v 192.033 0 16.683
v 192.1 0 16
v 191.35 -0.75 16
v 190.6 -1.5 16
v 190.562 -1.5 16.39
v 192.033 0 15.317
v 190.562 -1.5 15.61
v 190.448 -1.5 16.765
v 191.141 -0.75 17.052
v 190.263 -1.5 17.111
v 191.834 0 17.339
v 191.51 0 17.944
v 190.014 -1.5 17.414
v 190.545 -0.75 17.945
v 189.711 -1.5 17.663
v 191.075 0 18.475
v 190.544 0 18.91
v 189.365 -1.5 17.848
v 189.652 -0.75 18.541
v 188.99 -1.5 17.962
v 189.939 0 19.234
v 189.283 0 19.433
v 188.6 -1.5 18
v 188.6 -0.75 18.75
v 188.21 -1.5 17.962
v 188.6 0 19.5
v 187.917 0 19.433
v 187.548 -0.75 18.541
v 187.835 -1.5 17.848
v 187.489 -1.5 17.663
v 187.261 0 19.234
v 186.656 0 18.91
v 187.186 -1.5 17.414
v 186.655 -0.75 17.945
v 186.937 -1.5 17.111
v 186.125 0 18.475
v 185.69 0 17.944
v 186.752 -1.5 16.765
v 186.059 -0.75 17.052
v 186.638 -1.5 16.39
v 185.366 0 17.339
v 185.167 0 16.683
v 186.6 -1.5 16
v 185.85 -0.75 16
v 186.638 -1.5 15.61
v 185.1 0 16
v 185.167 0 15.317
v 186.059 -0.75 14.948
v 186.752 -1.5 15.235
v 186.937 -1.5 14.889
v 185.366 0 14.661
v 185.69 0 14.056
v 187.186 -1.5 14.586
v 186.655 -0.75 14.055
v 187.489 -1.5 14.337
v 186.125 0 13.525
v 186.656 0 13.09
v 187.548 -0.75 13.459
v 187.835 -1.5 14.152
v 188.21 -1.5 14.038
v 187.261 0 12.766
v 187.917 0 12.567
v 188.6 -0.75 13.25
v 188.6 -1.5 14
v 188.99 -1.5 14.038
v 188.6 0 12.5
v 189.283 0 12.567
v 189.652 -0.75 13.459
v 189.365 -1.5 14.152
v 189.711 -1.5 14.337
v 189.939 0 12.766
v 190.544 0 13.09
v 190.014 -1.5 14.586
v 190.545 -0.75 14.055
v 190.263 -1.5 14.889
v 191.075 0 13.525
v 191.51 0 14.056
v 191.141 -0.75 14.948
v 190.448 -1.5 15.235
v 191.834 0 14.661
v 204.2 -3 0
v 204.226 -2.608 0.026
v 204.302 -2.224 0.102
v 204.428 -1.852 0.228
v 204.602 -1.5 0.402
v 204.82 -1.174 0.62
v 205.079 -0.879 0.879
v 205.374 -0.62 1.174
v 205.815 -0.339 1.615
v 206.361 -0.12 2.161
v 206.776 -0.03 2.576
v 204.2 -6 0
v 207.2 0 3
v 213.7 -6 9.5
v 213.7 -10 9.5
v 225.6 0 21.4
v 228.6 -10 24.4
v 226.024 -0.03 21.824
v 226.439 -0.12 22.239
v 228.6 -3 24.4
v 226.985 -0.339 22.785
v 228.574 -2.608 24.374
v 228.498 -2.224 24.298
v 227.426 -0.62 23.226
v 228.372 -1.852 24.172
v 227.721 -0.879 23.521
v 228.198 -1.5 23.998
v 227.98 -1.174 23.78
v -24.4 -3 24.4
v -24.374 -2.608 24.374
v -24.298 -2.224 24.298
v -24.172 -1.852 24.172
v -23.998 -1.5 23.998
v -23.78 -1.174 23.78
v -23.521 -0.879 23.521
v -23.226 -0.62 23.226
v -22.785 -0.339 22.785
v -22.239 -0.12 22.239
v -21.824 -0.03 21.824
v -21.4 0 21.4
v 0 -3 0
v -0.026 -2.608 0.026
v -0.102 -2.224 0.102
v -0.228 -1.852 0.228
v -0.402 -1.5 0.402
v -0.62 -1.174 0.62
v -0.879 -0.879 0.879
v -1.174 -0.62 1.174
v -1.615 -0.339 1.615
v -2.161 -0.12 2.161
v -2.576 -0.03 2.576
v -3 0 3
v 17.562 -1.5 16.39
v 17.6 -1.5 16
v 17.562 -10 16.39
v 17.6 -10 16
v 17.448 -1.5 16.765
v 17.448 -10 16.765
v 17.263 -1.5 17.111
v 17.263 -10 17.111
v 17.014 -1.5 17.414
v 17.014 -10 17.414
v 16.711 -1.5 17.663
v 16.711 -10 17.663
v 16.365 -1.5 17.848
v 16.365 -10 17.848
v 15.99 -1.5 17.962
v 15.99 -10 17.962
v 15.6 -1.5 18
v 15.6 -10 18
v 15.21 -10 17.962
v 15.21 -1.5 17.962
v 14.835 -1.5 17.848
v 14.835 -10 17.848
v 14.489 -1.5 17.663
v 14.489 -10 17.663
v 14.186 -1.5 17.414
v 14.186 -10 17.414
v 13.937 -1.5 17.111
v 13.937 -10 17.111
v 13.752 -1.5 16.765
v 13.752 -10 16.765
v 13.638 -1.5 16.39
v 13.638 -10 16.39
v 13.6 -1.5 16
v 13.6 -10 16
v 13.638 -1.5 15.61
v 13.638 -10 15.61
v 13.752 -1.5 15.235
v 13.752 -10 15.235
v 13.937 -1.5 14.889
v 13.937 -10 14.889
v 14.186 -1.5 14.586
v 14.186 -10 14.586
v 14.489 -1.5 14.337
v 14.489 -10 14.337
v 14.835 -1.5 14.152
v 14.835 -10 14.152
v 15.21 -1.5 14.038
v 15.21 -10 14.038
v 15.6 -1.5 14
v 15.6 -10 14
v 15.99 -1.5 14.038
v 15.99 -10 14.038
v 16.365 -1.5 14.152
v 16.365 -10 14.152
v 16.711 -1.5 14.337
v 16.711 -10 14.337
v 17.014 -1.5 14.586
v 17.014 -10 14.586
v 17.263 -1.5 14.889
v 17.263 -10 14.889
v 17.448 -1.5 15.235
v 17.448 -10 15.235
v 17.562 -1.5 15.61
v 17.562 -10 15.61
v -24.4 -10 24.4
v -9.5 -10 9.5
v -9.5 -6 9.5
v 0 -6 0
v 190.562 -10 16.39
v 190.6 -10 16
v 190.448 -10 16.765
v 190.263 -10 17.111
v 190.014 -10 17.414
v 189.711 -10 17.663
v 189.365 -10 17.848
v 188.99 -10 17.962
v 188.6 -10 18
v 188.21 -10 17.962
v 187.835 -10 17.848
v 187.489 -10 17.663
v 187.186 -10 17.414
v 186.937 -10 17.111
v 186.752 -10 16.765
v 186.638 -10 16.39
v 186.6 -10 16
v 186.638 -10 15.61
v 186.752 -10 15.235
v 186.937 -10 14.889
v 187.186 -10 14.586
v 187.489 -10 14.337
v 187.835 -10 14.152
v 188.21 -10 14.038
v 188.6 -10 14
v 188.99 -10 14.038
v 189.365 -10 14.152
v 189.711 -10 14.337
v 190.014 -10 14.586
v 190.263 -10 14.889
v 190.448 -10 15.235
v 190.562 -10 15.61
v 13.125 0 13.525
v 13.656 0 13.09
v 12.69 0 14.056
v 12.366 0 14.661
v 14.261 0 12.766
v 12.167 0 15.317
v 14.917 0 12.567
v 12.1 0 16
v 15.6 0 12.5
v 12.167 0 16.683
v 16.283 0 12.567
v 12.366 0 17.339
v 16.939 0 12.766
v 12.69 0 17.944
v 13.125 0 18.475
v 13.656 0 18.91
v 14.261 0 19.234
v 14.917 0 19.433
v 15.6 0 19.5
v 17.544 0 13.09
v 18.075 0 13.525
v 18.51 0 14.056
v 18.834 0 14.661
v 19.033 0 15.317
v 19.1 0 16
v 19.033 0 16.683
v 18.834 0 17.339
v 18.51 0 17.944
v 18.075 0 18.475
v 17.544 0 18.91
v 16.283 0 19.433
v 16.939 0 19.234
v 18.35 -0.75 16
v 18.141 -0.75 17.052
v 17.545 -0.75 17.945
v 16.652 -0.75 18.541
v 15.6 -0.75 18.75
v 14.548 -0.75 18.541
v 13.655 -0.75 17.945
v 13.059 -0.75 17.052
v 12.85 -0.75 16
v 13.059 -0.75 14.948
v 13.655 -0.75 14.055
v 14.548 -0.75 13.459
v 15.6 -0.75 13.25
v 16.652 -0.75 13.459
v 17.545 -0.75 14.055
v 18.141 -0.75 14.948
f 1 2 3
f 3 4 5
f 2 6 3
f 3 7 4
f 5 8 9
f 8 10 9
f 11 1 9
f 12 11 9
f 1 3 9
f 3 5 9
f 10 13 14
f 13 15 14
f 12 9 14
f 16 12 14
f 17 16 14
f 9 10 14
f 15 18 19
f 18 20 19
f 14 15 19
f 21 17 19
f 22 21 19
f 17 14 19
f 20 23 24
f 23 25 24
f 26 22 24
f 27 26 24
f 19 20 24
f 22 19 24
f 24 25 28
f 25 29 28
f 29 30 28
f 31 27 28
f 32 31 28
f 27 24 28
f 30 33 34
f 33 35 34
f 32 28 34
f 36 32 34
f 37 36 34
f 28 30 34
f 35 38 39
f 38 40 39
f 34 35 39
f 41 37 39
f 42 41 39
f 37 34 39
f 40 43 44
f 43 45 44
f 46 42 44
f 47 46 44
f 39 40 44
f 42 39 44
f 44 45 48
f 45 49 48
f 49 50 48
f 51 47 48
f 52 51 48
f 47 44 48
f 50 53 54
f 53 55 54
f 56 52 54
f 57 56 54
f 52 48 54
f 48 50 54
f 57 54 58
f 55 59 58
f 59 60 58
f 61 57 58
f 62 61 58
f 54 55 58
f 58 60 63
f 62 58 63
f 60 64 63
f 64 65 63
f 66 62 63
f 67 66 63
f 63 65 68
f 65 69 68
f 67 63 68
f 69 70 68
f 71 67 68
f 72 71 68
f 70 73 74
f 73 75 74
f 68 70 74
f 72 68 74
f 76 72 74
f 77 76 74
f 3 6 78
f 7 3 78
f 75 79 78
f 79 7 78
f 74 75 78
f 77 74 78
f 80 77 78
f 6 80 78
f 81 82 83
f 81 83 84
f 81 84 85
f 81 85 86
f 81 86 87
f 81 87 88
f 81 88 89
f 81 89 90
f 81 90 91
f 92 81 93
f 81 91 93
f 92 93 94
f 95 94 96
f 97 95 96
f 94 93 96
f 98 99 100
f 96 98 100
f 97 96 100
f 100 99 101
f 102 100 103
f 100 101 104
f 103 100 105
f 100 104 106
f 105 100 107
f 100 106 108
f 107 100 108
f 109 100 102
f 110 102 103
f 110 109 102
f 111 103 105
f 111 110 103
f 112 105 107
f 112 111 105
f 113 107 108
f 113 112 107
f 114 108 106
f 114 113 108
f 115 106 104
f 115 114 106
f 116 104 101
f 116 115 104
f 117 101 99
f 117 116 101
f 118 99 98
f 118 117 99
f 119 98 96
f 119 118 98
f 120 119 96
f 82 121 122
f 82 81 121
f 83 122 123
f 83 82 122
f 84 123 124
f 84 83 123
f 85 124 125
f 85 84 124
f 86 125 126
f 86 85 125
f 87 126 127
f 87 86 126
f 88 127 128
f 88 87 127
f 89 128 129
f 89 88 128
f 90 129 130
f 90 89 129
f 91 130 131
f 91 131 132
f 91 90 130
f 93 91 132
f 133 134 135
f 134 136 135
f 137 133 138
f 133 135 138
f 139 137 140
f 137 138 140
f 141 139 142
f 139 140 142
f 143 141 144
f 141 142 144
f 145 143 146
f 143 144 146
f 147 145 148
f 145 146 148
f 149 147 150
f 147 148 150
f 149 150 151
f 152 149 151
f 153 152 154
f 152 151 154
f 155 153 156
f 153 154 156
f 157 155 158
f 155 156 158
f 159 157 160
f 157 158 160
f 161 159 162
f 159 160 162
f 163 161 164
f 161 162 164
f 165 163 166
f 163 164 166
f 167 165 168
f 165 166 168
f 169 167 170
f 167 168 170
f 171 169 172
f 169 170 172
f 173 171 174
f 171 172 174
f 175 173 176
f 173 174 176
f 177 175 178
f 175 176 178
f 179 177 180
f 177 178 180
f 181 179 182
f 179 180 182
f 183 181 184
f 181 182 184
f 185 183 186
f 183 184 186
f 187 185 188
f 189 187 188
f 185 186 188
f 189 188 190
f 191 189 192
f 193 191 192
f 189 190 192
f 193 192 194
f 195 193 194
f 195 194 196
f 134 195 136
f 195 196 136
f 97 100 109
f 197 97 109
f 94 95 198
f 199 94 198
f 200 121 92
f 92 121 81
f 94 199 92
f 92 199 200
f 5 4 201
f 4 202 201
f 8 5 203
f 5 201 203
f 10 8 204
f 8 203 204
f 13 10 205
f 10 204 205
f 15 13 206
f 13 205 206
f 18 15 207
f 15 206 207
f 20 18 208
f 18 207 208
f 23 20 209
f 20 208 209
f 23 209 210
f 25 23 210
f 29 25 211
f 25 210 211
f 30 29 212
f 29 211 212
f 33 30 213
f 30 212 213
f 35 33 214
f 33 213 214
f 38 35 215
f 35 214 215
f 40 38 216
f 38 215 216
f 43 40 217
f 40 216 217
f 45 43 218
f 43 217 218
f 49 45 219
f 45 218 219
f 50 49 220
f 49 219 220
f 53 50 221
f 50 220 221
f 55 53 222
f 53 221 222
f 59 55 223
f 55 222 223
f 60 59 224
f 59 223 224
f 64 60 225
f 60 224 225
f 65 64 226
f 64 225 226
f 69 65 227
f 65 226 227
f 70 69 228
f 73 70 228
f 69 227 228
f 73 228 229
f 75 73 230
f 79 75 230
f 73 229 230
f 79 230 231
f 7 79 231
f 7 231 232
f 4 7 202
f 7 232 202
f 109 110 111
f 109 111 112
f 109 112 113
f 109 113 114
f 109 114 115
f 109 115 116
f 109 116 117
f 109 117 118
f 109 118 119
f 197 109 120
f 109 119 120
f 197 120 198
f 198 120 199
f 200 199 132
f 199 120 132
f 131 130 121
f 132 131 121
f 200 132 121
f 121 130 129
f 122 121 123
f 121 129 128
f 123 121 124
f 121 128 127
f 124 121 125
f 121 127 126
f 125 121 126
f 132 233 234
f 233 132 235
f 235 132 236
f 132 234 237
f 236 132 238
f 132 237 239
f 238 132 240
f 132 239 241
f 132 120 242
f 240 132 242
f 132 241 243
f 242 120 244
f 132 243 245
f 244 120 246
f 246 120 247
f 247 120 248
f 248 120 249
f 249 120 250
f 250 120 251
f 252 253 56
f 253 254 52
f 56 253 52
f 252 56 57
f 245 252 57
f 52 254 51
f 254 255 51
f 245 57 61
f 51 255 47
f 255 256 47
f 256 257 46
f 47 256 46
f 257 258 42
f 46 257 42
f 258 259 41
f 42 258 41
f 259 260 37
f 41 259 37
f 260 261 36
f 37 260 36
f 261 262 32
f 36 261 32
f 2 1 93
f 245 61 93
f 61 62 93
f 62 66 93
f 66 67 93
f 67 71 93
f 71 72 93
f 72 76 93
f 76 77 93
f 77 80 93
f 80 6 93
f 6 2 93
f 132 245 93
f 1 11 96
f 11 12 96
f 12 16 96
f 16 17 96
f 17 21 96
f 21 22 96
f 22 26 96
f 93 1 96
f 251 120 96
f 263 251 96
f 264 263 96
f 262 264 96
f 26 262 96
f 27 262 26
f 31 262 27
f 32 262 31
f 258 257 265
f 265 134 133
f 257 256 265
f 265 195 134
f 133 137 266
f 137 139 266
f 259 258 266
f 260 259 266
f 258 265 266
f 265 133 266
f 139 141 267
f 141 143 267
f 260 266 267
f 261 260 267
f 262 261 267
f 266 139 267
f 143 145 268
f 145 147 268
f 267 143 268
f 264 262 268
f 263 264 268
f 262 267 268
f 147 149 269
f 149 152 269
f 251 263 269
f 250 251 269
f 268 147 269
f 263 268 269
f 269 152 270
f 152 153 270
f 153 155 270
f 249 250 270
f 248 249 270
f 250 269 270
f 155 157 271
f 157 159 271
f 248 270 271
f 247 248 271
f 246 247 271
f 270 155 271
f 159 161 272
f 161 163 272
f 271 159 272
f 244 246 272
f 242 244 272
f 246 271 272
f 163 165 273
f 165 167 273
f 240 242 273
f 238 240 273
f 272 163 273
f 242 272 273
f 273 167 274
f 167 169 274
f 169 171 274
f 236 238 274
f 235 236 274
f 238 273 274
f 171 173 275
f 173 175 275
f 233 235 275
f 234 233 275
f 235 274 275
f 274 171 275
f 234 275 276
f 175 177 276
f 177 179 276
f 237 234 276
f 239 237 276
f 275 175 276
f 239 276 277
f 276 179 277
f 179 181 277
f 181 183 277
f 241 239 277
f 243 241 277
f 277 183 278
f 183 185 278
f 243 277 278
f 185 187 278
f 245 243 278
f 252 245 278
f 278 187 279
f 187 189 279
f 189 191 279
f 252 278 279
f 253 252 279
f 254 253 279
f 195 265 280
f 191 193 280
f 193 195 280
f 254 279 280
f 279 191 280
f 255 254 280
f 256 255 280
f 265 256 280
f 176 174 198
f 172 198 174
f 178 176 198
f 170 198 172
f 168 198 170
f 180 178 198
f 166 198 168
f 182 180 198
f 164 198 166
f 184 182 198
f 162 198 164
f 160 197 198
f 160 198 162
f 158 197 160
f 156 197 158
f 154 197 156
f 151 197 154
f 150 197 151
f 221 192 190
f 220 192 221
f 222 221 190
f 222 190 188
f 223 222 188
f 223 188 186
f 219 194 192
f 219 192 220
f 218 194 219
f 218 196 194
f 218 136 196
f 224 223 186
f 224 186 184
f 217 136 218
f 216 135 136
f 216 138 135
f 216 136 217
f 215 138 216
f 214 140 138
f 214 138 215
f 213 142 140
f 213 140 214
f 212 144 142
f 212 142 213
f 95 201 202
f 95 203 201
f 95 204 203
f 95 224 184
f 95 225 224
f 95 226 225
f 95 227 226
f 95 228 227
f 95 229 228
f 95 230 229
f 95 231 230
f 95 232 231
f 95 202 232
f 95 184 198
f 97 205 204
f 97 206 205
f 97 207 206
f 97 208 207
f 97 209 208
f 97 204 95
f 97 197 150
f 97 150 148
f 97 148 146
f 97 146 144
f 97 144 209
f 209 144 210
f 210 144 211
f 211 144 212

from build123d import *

# Parameters (mm, degrees)
F1_DEPTH       = 10
F3_DEPTH       = 4
F5_D           = 4
F5_CSINK_D     = 7
F5_CSINK_ANGLE = 90
F6_R           = 3


with BuildPart() as f1:
    # F0 (on Front) → F1 (new body)
    with BuildSketch(Plane.XZ):
        Polygon((228.6, 24.4), (-24.4, 24.4), (0, 0), (204.2, 0), align=None)
    extrude(amount=F1_DEPTH)

    # F2 (on face) → F3 (cut)
    with BuildSketch(Plane.XZ.offset(10)):
        Polygon((-24.4, 9.5), (-24.4, 0), (0, 0), (-9.5, 9.5), align=None)
        Polygon((-9.5, 9.5), (0, 0), (204.2, 0), (213.7, 9.5), align=None)
        Polygon((213.7, 9.5), (204.2, 0), (228.6, 0), (228.6, 9.5), align=None)
    extrude(amount=-F3_DEPTH, mode=Mode.SUBTRACT)

    # F5 (through all)
    with Locations(Plane(origin=(0, 0, 0), x_dir=(-1, 0, 0), z_dir=(0, 1, 0))):
        with Locations((-188.6, 16), (-15.6, 16)):
            CounterSinkHole(F5_D / 2, F5_CSINK_D / 2, counter_sink_angle=F5_CSINK_ANGLE)

    # F6
    f6_edges = [f1.edges().sort_by_distance(p)[0] for p in [
        (102.1, 0, 0),
        (102.1, 0, 24.4),
    ]]
    fillet(f6_edges, radius=F6_R)


solid = f1.part
